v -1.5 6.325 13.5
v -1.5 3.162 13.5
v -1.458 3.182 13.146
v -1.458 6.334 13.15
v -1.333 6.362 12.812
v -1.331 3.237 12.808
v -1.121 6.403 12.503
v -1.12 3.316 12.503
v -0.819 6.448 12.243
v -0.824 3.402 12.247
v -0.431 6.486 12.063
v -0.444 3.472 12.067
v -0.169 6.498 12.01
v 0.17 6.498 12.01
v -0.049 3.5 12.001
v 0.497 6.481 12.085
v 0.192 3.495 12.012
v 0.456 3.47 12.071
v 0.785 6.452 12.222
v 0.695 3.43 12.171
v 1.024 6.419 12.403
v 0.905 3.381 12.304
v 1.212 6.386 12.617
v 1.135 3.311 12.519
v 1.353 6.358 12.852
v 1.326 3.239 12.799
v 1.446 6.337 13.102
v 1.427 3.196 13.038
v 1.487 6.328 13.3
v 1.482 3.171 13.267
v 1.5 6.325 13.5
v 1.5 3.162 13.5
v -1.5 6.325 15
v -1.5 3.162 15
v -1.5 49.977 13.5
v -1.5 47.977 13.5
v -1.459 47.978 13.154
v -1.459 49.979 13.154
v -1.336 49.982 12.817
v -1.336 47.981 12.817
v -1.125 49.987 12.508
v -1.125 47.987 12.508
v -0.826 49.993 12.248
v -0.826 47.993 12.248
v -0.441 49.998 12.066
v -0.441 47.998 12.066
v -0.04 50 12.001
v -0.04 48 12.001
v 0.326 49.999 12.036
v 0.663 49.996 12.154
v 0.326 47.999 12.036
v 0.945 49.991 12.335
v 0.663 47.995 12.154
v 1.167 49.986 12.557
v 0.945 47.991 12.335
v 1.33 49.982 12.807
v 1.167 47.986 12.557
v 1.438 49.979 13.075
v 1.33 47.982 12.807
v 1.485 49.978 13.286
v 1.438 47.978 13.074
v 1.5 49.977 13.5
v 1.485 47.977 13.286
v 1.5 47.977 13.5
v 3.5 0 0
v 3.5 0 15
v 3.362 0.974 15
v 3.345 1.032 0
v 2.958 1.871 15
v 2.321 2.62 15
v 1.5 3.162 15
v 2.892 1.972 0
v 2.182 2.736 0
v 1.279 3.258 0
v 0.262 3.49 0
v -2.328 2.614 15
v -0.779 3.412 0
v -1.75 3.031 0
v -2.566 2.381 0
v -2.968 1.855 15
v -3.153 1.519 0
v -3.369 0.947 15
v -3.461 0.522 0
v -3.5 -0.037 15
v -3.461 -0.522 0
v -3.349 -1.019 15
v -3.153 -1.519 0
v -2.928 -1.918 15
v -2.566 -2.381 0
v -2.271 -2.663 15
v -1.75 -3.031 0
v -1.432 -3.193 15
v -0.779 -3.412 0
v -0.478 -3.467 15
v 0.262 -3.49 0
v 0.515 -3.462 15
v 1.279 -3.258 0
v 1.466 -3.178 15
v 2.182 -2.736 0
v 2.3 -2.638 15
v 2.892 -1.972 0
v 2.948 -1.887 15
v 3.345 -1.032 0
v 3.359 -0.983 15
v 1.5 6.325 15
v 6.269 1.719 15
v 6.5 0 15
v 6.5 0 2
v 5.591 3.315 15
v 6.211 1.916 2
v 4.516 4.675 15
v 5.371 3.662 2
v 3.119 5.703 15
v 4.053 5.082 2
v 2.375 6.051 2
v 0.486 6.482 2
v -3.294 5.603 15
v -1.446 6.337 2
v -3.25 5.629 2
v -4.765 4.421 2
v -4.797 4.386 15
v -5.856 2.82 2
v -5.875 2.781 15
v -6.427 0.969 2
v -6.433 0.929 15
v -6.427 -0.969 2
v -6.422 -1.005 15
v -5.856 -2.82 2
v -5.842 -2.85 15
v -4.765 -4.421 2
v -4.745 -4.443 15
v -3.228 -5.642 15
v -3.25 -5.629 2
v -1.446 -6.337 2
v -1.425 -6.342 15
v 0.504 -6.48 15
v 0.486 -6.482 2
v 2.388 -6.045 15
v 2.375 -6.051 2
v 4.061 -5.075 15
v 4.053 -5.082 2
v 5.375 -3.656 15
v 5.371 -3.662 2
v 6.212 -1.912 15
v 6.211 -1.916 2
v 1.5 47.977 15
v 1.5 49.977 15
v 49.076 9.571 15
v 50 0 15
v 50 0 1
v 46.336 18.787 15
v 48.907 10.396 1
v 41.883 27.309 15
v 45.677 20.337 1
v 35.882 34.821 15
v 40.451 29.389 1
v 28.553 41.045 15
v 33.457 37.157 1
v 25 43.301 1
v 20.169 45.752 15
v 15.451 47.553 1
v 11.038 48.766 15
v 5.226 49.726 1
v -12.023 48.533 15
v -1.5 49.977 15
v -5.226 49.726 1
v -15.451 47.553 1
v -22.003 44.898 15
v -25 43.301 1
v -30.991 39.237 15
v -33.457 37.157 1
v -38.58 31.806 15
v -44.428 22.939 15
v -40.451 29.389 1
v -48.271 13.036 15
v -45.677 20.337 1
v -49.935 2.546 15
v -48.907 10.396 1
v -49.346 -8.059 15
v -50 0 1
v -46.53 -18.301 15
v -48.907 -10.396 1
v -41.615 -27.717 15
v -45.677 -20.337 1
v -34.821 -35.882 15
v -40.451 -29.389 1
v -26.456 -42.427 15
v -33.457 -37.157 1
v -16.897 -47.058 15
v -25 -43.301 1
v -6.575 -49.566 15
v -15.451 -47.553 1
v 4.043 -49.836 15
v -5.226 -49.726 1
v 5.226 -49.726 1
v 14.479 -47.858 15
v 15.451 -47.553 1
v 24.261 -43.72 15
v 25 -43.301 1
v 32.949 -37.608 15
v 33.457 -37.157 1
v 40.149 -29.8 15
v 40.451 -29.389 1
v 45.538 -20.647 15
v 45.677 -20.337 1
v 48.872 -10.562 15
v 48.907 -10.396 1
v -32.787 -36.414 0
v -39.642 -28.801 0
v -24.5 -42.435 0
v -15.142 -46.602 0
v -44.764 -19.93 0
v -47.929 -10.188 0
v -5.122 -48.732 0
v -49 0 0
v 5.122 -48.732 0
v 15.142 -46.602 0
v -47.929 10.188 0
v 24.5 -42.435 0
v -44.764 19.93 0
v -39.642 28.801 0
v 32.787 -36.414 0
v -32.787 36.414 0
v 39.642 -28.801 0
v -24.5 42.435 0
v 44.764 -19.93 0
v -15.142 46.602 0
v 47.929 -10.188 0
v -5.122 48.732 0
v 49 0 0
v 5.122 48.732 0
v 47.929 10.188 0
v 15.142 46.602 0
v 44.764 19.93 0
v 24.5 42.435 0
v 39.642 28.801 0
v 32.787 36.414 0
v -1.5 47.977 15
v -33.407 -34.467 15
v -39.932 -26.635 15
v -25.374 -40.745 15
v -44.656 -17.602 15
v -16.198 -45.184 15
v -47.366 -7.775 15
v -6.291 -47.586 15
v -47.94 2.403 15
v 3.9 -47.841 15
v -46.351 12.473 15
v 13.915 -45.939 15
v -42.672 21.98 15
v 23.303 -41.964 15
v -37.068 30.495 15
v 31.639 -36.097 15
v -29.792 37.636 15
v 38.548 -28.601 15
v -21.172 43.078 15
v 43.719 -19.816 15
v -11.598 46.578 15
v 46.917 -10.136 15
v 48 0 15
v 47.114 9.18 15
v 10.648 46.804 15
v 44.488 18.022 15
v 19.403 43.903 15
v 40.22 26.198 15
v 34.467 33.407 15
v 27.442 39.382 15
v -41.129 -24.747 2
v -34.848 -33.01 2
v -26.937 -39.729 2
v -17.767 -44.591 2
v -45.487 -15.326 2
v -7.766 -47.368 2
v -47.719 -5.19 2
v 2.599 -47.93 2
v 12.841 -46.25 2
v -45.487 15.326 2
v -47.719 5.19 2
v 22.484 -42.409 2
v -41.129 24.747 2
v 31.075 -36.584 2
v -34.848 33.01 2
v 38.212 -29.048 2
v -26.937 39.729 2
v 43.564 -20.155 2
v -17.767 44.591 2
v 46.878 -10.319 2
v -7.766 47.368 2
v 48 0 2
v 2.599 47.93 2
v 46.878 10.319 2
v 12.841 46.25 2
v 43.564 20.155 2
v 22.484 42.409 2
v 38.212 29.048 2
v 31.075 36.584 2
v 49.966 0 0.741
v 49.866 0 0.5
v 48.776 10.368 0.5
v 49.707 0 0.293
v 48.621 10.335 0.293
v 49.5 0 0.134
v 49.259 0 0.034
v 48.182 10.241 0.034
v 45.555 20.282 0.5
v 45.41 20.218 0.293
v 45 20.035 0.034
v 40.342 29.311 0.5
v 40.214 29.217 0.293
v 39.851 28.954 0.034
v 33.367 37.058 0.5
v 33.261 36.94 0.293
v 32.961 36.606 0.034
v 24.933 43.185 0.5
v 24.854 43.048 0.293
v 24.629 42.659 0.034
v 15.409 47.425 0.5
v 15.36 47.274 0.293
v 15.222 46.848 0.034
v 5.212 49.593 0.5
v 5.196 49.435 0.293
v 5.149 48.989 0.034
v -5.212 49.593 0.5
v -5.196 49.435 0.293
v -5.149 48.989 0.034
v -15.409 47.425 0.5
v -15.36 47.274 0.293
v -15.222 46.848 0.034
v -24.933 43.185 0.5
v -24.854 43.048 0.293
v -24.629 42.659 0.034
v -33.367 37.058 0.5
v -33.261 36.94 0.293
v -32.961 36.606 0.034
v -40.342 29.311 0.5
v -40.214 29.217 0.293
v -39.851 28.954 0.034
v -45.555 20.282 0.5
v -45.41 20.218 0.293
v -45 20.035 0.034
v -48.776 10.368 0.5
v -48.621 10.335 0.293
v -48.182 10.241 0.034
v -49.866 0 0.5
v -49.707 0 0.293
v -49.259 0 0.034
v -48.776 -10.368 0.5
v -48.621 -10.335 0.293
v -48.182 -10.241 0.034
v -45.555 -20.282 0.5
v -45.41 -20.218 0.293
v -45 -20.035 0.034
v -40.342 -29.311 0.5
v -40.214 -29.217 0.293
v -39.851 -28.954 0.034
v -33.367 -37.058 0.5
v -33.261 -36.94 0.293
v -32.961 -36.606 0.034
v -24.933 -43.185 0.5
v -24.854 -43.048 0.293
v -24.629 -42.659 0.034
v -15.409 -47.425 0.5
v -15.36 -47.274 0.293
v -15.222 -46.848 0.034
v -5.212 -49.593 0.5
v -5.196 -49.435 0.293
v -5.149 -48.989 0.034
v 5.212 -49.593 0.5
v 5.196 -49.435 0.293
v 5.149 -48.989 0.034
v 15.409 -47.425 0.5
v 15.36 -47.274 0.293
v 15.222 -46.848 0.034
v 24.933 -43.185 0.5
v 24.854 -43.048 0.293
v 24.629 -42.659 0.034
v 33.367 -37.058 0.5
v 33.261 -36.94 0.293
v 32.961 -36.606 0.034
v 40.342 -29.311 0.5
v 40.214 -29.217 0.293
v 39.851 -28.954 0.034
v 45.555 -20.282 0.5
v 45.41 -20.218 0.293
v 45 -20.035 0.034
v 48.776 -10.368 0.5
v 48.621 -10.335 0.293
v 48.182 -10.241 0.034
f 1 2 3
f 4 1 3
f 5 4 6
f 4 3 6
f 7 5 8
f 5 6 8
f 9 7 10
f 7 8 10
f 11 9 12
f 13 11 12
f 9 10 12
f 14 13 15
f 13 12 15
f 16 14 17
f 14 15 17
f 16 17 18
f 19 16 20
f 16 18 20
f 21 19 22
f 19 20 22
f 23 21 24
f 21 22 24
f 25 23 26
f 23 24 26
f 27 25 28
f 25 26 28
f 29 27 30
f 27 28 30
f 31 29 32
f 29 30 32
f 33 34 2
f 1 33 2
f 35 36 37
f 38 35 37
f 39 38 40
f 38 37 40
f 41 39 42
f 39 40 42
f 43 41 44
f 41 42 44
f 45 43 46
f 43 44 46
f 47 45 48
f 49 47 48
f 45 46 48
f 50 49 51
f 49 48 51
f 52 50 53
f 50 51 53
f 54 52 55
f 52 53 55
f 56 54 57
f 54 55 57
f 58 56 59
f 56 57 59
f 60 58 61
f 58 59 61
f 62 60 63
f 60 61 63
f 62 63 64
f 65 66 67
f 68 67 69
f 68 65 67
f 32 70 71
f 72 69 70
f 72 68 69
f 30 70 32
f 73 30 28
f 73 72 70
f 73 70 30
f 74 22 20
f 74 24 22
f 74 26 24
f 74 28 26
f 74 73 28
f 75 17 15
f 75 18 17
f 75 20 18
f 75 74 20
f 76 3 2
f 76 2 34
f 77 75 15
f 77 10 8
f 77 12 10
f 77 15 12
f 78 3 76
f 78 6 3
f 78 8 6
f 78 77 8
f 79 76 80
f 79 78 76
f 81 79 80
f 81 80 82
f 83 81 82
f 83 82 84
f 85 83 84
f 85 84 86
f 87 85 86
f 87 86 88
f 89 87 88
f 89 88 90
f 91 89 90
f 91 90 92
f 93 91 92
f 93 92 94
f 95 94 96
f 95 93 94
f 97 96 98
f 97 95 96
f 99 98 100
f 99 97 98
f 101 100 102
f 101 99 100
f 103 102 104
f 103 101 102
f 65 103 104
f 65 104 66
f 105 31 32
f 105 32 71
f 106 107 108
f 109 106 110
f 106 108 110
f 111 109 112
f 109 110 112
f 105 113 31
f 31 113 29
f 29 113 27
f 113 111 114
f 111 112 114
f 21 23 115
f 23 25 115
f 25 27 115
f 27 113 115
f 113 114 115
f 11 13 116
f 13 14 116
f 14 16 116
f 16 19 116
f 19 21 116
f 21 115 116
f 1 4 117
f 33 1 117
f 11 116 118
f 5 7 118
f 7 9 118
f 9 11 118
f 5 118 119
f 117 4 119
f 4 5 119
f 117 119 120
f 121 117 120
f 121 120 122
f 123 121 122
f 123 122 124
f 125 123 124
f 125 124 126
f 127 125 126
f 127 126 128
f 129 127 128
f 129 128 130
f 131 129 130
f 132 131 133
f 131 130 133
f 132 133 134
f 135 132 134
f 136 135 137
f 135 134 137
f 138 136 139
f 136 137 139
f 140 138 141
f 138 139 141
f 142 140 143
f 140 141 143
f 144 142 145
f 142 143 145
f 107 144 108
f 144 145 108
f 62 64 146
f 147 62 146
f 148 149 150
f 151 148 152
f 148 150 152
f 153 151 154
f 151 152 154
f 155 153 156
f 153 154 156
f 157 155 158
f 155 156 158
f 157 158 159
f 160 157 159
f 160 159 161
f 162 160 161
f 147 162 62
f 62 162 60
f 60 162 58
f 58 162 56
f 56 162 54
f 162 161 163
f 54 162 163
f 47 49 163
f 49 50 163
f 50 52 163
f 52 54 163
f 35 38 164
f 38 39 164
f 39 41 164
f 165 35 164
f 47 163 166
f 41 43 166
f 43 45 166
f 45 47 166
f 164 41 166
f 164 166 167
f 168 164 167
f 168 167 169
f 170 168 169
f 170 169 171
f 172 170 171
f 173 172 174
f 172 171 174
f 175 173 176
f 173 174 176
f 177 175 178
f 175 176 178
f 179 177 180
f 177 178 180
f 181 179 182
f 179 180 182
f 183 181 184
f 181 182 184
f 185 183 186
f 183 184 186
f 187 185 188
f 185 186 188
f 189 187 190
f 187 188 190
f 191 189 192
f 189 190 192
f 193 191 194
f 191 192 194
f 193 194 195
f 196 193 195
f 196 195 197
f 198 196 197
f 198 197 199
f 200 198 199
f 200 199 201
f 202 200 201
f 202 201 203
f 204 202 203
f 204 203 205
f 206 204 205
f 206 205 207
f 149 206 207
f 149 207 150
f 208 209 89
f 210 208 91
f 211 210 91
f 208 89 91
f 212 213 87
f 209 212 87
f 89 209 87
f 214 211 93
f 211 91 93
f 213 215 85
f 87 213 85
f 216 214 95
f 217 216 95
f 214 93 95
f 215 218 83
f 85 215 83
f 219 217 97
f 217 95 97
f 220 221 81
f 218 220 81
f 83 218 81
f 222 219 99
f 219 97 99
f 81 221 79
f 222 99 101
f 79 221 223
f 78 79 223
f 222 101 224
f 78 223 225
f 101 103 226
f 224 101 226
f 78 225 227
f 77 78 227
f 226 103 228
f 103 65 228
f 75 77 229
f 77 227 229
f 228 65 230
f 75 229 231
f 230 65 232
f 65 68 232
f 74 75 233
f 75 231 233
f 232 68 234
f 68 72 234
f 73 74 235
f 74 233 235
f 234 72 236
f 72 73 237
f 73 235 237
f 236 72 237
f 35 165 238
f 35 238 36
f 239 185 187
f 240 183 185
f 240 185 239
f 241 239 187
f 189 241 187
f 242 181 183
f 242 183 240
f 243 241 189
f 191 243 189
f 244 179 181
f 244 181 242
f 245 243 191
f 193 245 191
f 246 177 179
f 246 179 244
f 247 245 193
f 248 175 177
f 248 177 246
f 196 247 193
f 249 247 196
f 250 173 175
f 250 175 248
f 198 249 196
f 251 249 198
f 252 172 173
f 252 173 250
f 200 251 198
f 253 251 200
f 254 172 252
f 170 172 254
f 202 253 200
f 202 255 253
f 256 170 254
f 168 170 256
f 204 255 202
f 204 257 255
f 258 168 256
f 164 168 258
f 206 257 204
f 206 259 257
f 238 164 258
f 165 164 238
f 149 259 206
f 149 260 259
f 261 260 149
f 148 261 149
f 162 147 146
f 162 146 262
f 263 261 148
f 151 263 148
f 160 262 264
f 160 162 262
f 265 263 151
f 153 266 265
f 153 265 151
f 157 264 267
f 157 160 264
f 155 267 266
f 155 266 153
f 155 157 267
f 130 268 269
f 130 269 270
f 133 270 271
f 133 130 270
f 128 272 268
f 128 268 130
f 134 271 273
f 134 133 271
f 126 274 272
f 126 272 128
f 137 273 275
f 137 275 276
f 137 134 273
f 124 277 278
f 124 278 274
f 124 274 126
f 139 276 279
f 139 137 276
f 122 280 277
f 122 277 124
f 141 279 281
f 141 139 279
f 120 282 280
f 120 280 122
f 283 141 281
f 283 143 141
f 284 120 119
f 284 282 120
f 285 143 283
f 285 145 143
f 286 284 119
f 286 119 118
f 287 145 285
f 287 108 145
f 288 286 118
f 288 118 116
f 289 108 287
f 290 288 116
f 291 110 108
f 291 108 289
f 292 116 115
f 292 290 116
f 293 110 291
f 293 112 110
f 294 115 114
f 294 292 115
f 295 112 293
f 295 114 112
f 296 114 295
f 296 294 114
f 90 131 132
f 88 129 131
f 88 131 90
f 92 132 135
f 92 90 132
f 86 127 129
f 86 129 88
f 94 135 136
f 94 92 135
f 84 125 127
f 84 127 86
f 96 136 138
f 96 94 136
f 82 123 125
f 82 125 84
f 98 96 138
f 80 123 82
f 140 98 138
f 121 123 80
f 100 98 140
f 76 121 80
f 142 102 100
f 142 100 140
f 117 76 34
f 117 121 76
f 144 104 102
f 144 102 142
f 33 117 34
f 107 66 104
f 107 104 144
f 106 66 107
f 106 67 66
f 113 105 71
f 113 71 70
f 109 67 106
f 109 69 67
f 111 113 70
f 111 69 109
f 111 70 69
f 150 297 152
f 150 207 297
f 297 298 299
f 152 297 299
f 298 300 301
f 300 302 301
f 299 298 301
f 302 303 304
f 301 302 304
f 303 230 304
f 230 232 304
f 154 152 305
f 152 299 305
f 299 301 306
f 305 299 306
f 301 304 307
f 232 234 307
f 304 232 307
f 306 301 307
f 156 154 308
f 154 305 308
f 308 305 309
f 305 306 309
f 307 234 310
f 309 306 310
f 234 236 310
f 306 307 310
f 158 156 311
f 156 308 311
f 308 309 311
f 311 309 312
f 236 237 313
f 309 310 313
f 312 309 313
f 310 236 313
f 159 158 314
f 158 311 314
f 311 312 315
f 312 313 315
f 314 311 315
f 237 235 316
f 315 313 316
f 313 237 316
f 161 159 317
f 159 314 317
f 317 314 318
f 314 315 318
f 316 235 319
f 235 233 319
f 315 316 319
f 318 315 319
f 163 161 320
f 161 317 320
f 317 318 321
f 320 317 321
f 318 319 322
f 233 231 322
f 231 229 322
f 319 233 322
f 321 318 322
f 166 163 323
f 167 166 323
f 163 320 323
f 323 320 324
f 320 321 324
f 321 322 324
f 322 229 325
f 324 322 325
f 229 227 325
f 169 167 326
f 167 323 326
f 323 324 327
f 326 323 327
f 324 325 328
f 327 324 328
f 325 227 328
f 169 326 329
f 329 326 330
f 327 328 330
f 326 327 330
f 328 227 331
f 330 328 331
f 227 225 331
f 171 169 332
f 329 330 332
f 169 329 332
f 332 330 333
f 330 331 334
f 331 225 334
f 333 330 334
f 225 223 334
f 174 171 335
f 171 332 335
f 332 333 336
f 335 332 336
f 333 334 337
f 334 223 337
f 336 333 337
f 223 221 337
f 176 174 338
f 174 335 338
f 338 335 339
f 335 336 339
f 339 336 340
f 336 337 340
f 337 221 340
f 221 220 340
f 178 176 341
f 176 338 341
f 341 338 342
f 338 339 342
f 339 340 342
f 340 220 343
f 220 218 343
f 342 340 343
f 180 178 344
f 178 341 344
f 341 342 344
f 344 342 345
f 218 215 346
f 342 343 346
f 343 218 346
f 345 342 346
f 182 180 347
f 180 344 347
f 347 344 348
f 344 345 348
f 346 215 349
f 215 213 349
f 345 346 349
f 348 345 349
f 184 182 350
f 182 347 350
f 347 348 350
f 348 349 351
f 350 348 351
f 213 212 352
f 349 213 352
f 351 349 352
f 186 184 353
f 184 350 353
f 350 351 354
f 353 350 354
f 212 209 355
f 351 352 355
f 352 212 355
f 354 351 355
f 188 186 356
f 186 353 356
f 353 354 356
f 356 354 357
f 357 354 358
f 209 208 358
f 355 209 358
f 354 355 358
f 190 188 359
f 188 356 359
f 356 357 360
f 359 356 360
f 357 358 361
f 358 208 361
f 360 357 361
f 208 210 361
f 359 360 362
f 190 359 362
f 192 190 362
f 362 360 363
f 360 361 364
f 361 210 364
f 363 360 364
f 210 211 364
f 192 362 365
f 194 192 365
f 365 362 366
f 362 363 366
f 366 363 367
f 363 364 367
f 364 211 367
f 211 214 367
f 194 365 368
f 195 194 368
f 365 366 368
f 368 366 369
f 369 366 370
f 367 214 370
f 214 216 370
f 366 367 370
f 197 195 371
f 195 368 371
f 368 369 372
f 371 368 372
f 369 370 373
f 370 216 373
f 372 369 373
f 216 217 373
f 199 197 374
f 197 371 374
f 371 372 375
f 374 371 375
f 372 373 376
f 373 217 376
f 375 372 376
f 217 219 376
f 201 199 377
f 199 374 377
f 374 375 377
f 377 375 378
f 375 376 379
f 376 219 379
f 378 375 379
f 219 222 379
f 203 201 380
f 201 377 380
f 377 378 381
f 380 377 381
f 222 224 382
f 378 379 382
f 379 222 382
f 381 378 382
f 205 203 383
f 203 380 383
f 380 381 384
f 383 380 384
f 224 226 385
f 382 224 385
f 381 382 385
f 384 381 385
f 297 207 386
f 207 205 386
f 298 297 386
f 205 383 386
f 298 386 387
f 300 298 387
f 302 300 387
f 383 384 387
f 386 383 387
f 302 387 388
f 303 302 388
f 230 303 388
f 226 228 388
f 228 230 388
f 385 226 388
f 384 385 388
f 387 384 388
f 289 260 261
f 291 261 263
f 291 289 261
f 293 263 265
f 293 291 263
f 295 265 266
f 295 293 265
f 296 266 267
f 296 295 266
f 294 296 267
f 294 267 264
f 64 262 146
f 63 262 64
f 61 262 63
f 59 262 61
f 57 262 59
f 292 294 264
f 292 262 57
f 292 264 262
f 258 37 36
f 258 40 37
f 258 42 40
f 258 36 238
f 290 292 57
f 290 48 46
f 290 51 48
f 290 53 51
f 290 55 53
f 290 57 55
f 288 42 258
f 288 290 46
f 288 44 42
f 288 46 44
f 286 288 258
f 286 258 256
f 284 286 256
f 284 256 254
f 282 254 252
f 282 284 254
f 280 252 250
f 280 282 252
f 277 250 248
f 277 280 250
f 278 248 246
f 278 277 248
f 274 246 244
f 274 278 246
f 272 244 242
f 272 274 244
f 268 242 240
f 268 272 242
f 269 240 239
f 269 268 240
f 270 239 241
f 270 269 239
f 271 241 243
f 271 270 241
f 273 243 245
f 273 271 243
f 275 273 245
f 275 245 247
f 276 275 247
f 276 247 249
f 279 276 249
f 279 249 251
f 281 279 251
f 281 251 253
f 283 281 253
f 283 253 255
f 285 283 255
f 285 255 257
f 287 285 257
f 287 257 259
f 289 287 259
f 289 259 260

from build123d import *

# Parameters (mm, degrees)
F0_R     = 48
F0_R_2   = 6.5
F1_DEPTH = 2
F0_R_3   = 50
F0_R_4   = 3.5
F2_DEPTH = 15
F4_DEPTH = 70
F5_R     = 1


with BuildPart() as f1:
    # F0 (on Top) → F1 (new body)
    with BuildSketch(Plane.XY):
        Circle(F0_R)
        Circle(F0_R_2, mode=Mode.SUBTRACT)
    extrude(amount=F1_DEPTH)

    # F0 (on Top) → F2 (join)
    with BuildSketch(Plane.XY):
        Circle(F0_R_3)
        Circle(F0_R, mode=Mode.SUBTRACT)
        Circle(F0_R_2)
        Circle(F0_R_4, mode=Mode.SUBTRACT)
    extrude(amount=F2_DEPTH)

    # F3 (on Front) → F4 (cut)
    with BuildSketch(Plane.XZ):
        with BuildLine():
            ThreePointArc((-1.5, 13.5), (0, 15), (1.5, 13.5))
            Line((1.5, 13.5), (1.5, 16.5))
            Line((1.5, 16.5), (-1.5, 16.5))
            Line((-1.5, 16.5), (-1.5, 13.5))
        make_face()
        with BuildLine():
            Line((-1.5, 13.5), (1.5, 13.5))
            ThreePointArc((1.5, 13.5), (0, 15), (-1.5, 13.5))
        make_face()
        with BuildLine():
            ThreePointArc((-1.5, 13.5), (0, 12), (1.5, 13.5))
            Line((1.5, 13.5), (-1.5, 13.5))
        make_face()
    extrude(amount=-F4_DEPTH, mode=Mode.SUBTRACT)

    # F5
    f5_edges = [f1.edges().sort_by_distance(p)[0] for p in [
        (-50, 0, 0),
    ]]
    fillet(f5_edges, radius=F5_R)


solid = f1.part
